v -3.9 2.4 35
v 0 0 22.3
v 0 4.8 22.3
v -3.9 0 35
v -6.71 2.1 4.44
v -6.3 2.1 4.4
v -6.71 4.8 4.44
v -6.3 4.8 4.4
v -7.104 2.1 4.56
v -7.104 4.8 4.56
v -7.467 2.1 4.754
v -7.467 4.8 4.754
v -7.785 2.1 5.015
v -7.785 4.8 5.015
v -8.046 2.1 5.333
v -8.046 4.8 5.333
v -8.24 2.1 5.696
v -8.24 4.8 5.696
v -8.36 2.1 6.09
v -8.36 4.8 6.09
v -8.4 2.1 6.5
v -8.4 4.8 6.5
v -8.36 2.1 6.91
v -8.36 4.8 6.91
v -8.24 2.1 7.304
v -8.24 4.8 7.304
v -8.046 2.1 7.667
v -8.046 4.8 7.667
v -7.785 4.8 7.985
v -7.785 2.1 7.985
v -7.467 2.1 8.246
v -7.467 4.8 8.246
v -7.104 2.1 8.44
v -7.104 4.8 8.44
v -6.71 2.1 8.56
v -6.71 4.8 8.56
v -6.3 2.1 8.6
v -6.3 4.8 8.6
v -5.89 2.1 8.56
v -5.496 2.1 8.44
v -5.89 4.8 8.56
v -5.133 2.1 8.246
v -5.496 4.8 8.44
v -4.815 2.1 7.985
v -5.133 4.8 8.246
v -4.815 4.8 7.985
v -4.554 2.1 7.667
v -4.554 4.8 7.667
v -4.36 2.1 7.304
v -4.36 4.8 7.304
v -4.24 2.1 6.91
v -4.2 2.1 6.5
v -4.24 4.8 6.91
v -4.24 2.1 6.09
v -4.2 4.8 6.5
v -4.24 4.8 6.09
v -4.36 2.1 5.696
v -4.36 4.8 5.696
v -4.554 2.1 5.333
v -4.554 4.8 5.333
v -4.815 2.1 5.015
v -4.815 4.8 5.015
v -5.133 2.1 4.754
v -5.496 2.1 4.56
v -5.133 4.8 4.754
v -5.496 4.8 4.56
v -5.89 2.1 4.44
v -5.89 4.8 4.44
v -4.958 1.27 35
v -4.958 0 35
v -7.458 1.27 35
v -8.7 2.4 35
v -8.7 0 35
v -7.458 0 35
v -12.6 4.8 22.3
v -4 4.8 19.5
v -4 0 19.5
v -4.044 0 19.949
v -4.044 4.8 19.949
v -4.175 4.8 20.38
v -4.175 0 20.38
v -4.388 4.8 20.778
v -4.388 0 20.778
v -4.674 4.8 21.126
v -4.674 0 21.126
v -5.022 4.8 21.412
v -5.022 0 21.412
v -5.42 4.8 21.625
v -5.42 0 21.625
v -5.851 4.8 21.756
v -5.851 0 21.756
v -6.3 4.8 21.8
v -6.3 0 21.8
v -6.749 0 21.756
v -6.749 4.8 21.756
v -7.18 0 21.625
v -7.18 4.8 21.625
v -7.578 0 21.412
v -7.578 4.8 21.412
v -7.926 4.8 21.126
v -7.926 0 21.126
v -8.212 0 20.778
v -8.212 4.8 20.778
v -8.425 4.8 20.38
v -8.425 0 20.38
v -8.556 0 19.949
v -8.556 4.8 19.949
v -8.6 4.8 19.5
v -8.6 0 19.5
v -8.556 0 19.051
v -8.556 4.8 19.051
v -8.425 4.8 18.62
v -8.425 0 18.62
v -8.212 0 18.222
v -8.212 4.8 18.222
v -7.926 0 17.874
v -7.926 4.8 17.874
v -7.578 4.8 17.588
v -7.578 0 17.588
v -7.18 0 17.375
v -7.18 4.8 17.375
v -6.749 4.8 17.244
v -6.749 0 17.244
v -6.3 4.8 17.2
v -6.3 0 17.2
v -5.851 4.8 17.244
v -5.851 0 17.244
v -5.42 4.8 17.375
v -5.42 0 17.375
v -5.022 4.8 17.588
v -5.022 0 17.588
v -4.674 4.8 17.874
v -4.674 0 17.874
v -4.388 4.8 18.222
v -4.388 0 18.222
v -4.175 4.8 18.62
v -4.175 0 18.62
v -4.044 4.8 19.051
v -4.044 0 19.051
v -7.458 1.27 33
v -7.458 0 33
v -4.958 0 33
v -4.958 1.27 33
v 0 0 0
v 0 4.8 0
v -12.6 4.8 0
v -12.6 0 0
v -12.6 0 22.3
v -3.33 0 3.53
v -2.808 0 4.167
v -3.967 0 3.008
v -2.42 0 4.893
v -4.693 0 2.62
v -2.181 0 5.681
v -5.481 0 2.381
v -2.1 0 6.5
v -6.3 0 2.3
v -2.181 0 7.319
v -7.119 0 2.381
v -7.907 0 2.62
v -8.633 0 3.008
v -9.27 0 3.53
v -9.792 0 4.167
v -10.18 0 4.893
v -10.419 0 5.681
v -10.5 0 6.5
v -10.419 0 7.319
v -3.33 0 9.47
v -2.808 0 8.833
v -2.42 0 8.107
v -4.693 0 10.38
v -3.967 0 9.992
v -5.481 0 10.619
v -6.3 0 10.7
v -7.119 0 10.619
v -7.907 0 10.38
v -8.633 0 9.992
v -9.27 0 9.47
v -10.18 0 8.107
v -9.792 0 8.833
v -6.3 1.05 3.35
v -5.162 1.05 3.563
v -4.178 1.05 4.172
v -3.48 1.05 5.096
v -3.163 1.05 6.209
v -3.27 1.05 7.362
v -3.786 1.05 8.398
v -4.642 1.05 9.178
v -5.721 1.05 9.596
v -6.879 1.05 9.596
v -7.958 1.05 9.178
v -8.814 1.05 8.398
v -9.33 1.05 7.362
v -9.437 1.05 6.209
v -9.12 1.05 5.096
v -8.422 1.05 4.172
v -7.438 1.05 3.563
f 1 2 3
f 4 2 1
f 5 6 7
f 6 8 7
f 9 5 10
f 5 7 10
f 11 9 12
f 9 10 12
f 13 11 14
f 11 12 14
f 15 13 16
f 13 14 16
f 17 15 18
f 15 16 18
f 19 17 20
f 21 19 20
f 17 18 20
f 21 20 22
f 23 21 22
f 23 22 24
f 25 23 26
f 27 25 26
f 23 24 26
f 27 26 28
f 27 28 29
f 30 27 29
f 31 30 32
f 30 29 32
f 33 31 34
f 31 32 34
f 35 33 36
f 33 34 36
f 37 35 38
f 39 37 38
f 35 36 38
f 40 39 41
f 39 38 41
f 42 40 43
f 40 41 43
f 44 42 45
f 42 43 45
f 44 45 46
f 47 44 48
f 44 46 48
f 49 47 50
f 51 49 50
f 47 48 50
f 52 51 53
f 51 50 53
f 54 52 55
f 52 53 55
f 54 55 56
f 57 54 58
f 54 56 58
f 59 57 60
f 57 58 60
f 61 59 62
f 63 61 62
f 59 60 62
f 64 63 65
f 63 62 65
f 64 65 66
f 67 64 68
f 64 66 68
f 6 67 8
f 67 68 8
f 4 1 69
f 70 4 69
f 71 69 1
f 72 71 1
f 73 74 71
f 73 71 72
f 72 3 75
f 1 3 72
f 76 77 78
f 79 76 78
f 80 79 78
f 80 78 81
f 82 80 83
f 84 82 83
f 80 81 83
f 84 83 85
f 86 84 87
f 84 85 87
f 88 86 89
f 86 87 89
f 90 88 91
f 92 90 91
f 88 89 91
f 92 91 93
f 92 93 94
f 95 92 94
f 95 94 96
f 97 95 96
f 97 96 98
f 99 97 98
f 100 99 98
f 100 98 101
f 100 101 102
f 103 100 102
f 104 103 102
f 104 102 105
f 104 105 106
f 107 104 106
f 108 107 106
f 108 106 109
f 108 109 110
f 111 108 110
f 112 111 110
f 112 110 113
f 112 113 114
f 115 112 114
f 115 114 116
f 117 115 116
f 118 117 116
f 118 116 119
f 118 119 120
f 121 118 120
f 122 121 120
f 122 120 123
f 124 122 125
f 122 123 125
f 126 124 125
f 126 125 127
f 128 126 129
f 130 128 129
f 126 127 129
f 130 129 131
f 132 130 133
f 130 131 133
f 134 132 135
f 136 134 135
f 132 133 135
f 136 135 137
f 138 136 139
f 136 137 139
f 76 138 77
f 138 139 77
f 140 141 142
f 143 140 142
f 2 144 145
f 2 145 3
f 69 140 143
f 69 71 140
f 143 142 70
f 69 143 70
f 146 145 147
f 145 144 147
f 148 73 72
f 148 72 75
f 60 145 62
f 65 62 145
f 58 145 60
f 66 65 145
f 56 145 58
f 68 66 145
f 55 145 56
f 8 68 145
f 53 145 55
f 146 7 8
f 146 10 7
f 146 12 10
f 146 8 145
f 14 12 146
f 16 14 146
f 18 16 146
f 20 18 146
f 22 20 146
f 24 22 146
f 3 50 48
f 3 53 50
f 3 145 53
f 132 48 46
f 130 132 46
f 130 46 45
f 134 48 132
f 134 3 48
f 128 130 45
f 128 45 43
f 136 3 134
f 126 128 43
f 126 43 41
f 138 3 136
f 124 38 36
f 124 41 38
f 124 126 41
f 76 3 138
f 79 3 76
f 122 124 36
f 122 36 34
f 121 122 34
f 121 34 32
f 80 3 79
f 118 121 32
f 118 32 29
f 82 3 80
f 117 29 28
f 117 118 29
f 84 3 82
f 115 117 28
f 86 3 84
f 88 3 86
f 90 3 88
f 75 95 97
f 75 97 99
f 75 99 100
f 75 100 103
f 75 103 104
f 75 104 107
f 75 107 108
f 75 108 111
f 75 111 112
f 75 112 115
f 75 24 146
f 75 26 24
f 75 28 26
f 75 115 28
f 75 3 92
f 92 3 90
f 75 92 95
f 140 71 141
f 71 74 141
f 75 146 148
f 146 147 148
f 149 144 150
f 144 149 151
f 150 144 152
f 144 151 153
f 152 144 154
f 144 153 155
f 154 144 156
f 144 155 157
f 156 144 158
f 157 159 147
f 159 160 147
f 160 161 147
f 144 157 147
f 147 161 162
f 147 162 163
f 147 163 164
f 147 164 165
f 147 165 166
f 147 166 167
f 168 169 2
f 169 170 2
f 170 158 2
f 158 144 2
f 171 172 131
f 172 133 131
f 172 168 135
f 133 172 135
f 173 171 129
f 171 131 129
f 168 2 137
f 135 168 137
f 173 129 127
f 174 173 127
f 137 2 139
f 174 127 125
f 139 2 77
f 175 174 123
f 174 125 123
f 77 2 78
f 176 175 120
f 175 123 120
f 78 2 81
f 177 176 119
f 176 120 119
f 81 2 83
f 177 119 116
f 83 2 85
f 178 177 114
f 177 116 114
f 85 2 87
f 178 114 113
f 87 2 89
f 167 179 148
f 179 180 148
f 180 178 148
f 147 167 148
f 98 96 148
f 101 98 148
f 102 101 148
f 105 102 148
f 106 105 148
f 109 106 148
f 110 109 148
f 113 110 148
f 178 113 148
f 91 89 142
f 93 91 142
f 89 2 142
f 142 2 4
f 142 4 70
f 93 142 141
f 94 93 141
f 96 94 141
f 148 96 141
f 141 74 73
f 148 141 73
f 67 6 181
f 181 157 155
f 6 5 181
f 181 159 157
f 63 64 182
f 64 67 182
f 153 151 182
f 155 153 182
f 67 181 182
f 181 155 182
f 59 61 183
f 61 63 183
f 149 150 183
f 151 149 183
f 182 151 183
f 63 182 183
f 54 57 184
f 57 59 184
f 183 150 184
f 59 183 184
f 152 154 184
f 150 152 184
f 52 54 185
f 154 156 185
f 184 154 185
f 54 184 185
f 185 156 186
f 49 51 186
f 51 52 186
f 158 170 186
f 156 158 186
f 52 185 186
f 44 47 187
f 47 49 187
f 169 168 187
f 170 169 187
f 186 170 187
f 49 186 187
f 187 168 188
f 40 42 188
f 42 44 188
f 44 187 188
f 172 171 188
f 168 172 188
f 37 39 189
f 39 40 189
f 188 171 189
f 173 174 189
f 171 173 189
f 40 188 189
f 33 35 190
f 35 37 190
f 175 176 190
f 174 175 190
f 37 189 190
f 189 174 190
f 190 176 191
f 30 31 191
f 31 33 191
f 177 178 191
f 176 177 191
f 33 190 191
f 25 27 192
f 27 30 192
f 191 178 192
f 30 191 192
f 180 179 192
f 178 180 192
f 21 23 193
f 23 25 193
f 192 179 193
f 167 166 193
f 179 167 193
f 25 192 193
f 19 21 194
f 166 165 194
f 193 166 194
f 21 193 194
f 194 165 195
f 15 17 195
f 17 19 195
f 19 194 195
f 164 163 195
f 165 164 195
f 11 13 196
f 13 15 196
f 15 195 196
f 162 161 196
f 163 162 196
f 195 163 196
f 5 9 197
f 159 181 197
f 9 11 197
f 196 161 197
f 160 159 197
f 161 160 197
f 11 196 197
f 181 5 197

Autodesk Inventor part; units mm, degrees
ref_plane "YZ Plane" through (0, 0, 0) normal (1, 0, 0) x (0, 1, 0)
ref_plane "XZ Plane" through (0, 0, 0) normal (0, 1, 0) x (-1, 0, 0)
ref_plane "XY Plane" through (0, 0, 0) normal (0, 0, 1) x (1, 0, 0)
sketch "Sketch1" plane through (0, 0, 0) normal (0, 1, 0) x (-1, 0, 0)
  line L0 (0, 0) -> (12.6, 0)
  line L1 (12.6, 0) -> (12.6, 22.3)
  line L2 (0, 0) -> (0, 22.3)
  line L3 (0, 22.3) -> (3.9, 35)
  line L4 (3.9, 35) -> (8.7, 35)
  line L5 (8.7, 35) -> (12.6, 22.3)
  point P0 (6.3, 6.5)
  dimension "d4" = 22.3
  dimension "d5" = 4.8
extrude "Extrusion1" add sketch "Sketch1" along normal blind 4.8
sketch "Sketch2" plane through (0, 0, 0) normal (0, -1, 0) x (1, 0, 0)
  point P0 (0, 0)
  point P1 (-6.3, 6.5)
hole "Hole1" at (-6.3, 0, 6.5) direction (0, 1, 0) diameter 4.2 depth 8 tip angle 118 countersink diameter 8.4 countersink angle 90
sketch "Sketch3" plane through (0, 0, 0) normal (0, -1, 0) x (1, 0, 0)
  circle A0 centre (-6.3, 19.5) radius 2.3
  point P0 (0, 0)
  dimension "d13" = 4.6
extrude "Extrusion2" cut sketch "Sketch3" against normal through all
sketch "Sketch4" plane through (0, 0, 0) normal (1, 0, 0) x (0, 1, 0)
  line L0 (0, 35) -> (4.8, 35) projected
  line L1 (0, 22.3) -> (4.8, 22.3) projected
  line L2 (4.8, 22.3) -> (2.4, 35)
  line L3 (4.8, 35) -> (4.8, 22.3) projected
  line L4 (2.4, 35) -> (4.8, 35)
  line L5 (4.8, 35) -> (4.8, 22.3)
  point P0 (0, 0)
extrude "Extrusion3" cut sketch "Sketch4" against normal through all
sketch "Sketch5" plane through (0, 0, 0) normal (1, 0, 0) x (0, 1, 0)
  point P0 (0, 0)
sketch "Sketch6" plane through (0, 0, 0) normal (0, -1, 0) x (1, 0, 0)
  line L0 (-8.7, 35) -> (-3.9, 35) projected
  line L1 (-4.9584, 35) -> (-7.4584, 35)
  line L2 (-7.4584, 35) -> (-7.4584, 33)
  line L3 (-7.4584, 33) -> (-4.9584, 33)
  line L4 (-4.9584, 33) -> (-4.9584, 35)
  point P0 (0, 0)
  point P1 (-6.3, 35)
  dimension "d18" = 2.5
  dimension "d19" = 2
extrude "Extrusion4" cut sketch "Sketch6" against normal blind 1.27
properties part number "HeadbarClampBottom"
